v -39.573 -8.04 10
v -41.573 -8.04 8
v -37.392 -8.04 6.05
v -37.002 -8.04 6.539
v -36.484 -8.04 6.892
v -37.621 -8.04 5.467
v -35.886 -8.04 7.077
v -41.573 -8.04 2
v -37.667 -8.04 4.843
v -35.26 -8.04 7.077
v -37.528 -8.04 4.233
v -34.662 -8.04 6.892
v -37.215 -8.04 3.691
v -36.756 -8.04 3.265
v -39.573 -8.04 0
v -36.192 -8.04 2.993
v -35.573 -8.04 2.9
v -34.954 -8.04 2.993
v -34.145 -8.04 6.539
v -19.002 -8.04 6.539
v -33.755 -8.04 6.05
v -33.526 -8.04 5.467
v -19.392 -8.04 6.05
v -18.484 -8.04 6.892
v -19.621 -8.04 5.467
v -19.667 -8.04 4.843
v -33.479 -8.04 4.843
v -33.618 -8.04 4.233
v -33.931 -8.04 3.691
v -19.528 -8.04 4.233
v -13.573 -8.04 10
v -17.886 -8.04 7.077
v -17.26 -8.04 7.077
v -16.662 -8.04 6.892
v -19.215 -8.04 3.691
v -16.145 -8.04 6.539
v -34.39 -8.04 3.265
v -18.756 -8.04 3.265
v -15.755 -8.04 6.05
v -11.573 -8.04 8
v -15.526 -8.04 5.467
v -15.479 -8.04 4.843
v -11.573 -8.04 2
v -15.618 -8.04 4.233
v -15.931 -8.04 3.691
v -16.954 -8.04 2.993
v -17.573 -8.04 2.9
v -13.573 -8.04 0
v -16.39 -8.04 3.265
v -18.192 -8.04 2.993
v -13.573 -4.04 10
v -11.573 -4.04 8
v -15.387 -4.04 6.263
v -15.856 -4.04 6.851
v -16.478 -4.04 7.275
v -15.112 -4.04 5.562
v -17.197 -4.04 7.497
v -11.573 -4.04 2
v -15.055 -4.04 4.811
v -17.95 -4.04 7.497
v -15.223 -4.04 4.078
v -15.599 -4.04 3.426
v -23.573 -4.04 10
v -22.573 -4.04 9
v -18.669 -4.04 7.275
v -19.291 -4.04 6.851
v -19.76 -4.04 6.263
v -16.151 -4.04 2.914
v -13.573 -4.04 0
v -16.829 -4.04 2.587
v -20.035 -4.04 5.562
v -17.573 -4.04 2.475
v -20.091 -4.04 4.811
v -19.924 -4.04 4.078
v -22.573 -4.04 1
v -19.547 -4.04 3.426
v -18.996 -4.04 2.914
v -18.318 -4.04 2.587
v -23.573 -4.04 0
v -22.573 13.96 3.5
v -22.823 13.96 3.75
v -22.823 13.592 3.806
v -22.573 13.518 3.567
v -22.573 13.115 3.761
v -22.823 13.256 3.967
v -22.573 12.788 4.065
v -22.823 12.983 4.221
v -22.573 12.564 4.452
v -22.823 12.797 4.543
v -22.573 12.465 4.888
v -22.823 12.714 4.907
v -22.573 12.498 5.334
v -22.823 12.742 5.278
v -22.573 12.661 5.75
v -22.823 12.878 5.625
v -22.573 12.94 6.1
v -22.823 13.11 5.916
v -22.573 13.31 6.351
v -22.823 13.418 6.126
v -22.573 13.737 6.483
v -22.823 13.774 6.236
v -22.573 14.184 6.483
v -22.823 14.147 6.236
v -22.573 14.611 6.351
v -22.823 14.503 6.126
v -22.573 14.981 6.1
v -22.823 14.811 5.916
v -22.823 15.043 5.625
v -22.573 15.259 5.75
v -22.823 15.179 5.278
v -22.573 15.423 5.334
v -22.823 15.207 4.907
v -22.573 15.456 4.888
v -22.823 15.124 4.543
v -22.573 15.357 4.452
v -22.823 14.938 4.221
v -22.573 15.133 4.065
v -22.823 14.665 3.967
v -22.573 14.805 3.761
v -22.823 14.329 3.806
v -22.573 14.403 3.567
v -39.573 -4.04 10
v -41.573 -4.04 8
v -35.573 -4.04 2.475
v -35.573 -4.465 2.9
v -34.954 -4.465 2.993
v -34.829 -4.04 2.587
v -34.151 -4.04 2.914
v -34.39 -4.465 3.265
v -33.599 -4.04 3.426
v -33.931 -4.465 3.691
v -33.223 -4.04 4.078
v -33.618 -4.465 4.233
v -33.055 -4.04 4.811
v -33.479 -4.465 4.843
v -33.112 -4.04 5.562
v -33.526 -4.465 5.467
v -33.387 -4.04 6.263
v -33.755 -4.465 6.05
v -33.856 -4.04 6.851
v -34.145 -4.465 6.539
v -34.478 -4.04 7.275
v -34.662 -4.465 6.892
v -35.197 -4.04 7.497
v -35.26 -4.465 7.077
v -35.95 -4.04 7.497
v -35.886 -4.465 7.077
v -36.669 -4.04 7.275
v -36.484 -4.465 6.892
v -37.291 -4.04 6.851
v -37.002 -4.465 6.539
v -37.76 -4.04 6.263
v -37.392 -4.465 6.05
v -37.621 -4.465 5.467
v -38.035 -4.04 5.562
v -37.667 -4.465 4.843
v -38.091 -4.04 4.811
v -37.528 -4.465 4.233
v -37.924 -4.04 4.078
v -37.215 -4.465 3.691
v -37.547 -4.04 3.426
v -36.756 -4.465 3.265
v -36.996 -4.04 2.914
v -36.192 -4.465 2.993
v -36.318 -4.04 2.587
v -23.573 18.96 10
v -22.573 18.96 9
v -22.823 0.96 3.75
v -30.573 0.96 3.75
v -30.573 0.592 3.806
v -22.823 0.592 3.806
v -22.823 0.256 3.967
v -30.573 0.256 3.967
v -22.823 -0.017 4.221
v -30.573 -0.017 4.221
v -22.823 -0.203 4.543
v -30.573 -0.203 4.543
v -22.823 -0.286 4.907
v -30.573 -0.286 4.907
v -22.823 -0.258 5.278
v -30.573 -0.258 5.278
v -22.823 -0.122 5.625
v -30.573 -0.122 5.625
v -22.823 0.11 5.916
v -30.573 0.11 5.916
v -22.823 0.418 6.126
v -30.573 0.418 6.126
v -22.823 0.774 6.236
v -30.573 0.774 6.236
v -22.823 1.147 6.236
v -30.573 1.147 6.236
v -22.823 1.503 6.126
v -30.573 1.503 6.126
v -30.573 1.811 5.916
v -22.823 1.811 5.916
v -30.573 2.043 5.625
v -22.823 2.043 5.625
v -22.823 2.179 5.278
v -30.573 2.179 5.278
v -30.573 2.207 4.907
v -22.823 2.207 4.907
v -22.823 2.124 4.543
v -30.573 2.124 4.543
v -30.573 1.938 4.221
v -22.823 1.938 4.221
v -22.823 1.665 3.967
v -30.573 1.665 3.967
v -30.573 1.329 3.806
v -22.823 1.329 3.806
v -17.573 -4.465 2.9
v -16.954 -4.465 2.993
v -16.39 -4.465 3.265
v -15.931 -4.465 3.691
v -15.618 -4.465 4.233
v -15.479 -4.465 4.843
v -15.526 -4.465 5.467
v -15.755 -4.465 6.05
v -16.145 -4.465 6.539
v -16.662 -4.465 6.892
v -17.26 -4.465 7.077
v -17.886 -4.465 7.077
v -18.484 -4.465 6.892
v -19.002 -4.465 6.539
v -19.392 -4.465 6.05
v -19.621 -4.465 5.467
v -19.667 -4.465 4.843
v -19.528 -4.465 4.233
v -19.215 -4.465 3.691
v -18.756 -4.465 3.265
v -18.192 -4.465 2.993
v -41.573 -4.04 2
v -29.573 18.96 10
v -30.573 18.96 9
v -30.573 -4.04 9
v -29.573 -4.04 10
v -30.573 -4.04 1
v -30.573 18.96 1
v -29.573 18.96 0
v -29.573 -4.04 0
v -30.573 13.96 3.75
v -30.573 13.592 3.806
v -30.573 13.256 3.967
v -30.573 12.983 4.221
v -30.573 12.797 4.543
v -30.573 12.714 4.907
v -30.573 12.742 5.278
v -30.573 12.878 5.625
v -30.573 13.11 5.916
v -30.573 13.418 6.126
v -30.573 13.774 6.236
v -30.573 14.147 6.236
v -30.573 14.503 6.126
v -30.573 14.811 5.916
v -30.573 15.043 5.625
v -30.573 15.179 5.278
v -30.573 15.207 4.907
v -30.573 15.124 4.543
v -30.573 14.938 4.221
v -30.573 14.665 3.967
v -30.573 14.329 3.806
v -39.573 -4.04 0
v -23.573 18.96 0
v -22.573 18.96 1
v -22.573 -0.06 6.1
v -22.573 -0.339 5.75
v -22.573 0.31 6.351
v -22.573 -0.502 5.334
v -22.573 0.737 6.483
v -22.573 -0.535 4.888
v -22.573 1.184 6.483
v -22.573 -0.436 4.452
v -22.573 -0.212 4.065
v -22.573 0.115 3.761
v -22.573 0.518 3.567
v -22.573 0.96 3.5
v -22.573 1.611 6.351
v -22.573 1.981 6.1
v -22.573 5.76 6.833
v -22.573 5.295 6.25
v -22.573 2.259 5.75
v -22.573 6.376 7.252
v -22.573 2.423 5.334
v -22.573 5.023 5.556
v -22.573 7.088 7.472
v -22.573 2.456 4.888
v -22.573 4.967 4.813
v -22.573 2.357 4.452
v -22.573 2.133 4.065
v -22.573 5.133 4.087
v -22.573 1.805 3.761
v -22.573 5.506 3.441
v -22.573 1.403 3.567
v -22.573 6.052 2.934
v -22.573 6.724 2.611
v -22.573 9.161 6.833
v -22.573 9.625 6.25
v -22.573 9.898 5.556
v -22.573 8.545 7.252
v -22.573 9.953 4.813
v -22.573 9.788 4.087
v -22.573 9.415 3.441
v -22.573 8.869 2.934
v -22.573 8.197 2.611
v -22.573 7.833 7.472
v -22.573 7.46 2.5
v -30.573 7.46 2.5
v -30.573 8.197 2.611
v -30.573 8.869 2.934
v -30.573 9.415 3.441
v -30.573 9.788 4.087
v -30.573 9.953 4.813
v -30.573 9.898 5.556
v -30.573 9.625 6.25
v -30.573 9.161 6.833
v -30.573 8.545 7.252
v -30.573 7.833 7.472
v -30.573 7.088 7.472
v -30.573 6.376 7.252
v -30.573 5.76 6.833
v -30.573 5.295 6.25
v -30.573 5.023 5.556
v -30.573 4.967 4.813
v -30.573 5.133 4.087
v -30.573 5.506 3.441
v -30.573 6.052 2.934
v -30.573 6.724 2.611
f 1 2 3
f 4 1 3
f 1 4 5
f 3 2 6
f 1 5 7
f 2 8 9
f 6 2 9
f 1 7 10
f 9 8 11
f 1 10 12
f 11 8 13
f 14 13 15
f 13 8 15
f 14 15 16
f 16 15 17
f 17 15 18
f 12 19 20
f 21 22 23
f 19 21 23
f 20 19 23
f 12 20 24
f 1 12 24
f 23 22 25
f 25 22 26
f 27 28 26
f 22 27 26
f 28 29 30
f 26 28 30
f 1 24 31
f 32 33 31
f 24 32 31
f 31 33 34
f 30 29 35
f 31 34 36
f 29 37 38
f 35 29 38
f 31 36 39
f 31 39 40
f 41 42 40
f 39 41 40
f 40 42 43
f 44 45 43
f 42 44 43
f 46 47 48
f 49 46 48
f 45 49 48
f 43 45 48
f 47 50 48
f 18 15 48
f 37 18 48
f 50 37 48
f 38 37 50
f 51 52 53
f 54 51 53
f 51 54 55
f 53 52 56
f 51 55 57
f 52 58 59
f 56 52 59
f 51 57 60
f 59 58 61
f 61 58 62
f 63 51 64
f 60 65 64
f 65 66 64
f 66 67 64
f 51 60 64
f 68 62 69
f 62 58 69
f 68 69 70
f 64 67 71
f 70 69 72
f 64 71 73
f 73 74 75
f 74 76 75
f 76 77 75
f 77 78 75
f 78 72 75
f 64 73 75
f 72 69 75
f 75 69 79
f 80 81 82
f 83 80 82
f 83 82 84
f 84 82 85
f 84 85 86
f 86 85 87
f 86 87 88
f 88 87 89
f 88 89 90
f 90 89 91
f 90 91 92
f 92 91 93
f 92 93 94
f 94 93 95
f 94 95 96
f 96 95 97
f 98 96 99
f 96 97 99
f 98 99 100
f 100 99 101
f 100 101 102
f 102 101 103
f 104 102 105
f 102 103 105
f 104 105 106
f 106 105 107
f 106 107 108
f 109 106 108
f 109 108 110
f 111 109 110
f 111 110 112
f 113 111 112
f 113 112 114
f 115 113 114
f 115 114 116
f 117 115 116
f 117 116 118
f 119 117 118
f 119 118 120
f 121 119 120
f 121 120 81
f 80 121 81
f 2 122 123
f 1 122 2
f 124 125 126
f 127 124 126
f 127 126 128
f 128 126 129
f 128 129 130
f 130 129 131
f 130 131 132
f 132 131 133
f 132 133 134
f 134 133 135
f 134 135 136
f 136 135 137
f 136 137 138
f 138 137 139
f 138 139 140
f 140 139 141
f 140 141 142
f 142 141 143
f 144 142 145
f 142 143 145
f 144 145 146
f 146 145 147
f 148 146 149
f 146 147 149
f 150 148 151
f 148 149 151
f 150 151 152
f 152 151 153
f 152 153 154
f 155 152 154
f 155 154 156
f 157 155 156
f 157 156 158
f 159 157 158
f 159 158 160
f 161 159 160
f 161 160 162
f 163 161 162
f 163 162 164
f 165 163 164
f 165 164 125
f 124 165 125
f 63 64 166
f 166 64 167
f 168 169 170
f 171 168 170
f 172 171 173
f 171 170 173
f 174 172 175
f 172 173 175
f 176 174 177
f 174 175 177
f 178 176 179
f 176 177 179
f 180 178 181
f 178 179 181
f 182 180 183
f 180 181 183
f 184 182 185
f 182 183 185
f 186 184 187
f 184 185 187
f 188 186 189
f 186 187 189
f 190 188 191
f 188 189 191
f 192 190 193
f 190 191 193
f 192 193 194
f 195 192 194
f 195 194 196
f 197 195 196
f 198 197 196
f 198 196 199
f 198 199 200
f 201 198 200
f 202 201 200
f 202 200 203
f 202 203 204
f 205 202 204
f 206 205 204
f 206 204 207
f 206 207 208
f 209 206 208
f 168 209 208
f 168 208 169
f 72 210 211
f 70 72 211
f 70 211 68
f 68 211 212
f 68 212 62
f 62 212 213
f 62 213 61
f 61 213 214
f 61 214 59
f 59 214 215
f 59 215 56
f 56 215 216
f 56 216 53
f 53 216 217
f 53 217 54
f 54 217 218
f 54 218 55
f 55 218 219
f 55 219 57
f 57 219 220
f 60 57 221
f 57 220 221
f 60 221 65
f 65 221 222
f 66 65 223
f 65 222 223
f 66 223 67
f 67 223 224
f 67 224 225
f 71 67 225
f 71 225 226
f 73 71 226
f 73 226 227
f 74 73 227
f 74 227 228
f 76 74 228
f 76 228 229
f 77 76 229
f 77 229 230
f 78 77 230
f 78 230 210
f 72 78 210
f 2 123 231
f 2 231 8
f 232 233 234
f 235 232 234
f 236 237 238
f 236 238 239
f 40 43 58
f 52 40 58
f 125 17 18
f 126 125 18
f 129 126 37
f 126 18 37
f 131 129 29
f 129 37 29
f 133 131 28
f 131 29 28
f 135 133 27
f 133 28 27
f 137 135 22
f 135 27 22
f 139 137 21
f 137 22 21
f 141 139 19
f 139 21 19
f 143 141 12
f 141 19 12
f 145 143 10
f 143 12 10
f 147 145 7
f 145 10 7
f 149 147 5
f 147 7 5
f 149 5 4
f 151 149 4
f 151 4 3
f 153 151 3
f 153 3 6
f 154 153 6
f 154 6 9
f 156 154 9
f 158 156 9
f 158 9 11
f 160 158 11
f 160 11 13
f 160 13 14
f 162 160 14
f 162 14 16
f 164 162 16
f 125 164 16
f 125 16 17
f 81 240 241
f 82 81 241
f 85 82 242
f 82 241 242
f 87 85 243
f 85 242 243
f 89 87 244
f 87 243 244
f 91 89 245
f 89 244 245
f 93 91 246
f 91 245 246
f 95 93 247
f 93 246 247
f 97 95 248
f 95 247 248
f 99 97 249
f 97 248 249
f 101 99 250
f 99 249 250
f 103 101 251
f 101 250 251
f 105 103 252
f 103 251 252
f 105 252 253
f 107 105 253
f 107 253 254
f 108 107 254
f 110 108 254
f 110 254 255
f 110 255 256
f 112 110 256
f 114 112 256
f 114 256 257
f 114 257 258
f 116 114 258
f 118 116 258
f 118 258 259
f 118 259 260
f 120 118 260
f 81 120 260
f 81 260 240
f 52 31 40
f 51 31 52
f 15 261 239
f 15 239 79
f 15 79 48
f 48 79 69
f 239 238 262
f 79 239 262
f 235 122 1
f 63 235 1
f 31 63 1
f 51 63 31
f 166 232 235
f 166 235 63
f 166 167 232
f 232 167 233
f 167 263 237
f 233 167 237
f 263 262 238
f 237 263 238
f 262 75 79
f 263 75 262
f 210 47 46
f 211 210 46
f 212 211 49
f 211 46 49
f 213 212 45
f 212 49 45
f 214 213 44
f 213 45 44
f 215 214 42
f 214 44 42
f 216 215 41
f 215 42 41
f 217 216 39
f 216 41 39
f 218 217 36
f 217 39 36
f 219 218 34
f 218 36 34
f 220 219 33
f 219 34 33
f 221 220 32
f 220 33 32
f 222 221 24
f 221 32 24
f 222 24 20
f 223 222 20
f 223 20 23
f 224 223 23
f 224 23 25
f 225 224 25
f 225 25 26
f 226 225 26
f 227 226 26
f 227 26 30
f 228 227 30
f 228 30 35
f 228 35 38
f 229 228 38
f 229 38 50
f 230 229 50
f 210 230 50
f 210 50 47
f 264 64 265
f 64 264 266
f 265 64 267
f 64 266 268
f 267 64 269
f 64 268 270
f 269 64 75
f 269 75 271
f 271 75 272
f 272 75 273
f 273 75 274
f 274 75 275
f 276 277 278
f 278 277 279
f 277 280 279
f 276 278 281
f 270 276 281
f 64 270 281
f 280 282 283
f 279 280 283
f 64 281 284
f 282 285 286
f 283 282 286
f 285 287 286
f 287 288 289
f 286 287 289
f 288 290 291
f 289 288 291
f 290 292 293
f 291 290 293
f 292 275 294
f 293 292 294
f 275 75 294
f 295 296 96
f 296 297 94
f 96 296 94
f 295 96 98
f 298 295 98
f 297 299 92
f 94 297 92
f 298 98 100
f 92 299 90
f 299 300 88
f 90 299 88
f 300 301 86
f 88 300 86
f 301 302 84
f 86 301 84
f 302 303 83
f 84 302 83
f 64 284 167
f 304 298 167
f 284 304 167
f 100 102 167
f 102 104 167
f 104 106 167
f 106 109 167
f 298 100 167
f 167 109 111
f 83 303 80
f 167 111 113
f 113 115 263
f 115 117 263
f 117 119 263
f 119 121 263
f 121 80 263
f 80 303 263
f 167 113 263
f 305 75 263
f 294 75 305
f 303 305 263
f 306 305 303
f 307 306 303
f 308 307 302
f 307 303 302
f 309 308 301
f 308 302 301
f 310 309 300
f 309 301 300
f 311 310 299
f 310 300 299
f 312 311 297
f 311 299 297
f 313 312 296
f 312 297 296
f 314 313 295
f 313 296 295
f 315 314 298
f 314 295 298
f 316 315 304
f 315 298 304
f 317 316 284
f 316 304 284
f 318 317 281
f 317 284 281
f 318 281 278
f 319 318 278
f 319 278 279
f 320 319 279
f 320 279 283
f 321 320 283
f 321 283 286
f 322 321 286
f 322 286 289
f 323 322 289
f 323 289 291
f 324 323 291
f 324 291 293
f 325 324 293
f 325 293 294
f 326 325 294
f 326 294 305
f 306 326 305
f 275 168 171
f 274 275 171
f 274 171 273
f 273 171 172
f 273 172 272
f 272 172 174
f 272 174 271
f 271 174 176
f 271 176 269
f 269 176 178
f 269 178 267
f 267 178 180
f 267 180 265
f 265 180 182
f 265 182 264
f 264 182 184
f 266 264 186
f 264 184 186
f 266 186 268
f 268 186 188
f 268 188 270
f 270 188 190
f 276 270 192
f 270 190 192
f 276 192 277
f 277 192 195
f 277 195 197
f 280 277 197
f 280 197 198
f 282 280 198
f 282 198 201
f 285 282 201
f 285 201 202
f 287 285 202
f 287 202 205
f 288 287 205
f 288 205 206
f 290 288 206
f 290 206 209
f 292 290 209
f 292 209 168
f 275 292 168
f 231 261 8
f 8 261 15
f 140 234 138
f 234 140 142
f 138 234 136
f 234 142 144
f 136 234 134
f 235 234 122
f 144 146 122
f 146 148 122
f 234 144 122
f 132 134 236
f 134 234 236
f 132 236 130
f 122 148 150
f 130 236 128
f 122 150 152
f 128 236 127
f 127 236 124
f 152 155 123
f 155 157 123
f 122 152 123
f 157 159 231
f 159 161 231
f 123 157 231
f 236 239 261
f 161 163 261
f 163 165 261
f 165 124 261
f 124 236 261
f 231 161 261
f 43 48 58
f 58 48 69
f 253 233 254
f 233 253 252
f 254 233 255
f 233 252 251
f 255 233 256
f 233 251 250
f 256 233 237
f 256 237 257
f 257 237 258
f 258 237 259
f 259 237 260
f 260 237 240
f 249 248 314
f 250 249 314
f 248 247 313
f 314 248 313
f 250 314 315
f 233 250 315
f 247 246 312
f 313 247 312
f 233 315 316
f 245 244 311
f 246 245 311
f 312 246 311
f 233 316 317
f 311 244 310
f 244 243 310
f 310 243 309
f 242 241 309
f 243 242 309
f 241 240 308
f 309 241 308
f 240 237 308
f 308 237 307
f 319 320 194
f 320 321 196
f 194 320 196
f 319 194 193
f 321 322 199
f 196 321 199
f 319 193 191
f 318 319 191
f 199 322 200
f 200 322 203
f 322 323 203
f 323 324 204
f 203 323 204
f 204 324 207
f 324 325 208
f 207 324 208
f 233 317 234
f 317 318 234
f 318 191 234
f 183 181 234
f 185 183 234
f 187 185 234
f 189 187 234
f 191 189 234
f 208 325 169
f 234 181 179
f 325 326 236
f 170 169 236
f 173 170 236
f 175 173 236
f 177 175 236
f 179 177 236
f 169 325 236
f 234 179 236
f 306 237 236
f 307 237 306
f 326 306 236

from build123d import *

# Parameters (mm, degrees)
EXTRUDE_1_DEPTH              = 10
CHAMFER_1_SIZE               = 2
CHAMFER_2_SIZE               = 1
CUT_EXTRUDE_2_REACH          = 21
SKETCH_3_R                   = 2.5
HOLE_WIZARD_M3_1_D           = 2.5
HOLE_WIZARD_M3_1_DEPTH       = 8
HOLE_WIZARD_M3_1_CSINK_D     = 3
HOLE_WIZARD_M3_1_CSINK_ANGLE = 90
HOLE_WIZARD_M5_1_D           = 4.2
HOLE_WIZARD_M5_1_DEPTH       = 4
HOLE_WIZARD_M5_1_CSINK_D     = 5.05
HOLE_WIZARD_M5_1_CSINK_ANGLE = 90


with BuildPart() as part:
    # 草图1 → 凸台-拉伸1 (new body)
    with BuildSketch(Plane.XY):
        Polygon((-41.573313116, -4.039574182), (-41.573313116, -8.039574182), (-11.573313116, -8.039574182), (-11.573313116, -4.039574182), (-22.573313116, -4.039574182), (-22.573313116, 18.960425818), (-30.573313116, 18.960425818), (-30.573313116, -4.039574182), align=None)
    extrude(amount=EXTRUDE_1_DEPTH)

    # 倒角1
    chamfer_1_edges = [part.edges().sort_by_distance(p)[0] for p in [
        (-11.573313116, -6.039574182, 0),
        (-41.573313116, -6.039574182, 0),
        (-11.573313116, -6.039574182, 10),
        (-41.573313116, -6.039574182, 10),
    ]]
    chamfer(chamfer_1_edges, length=CHAMFER_1_SIZE)

    # 倒角2
    chamfer_2_edges = [part.edges().sort_by_distance(p)[0] for p in [
        (-22.573313116, 7.460425818, 10),
        (-30.573313116, 7.460425818, 10),
        (-30.573313116, 7.460425818, 0),
        (-22.573313116, 7.460425818, 0),
    ]]
    chamfer(chamfer_2_edges, length=CHAMFER_2_SIZE)

    # 草图3 → 切除-拉伸2 (cut, up to next)
    with BuildSketch(Plane(origin=(-22.573313116, 0, 0), x_dir=(0, 0, -1), z_dir=(1, 0, 0)), mode=Mode.PRIVATE) as cut_extrude_2_sk1:
        with Locations((-5, 7.460425818)):
            Circle(SKETCH_3_R)
    cut_extrude_2_tool1 = extrude(cut_extrude_2_sk1.sketch, amount=-CUT_EXTRUDE_2_REACH, mode=Mode.PRIVATE) & part.part
    add(cut_extrude_2_tool1.solids().sort_by_distance((-22.573313, 7.460426, 5))[0], mode=Mode.SUBTRACT)

    # M3 螺纹孔1
    with Locations(Plane(origin=(-22.573313116, 13.960425818, 5), x_dir=(0, 0, 1), z_dir=(1, 0, 0))):
        with Locations((0, 0), (0, 13)):
            CounterSinkHole(HOLE_WIZARD_M3_1_D / 2, HOLE_WIZARD_M3_1_CSINK_D / 2, depth=HOLE_WIZARD_M3_1_DEPTH, counter_sink_angle=HOLE_WIZARD_M3_1_CSINK_ANGLE)

    # M5 螺纹孔1
    with Locations(Plane(origin=(-35.573313116, -4.039574182, 5), x_dir=(0, 0, 1), z_dir=(0, 1, 0))):
        with Locations((0, 0), (0, 18)):
            CounterSinkHole(HOLE_WIZARD_M5_1_D / 2, HOLE_WIZARD_M5_1_CSINK_D / 2, depth=HOLE_WIZARD_M5_1_DEPTH, counter_sink_angle=HOLE_WIZARD_M5_1_CSINK_ANGLE)


solid = part.part
